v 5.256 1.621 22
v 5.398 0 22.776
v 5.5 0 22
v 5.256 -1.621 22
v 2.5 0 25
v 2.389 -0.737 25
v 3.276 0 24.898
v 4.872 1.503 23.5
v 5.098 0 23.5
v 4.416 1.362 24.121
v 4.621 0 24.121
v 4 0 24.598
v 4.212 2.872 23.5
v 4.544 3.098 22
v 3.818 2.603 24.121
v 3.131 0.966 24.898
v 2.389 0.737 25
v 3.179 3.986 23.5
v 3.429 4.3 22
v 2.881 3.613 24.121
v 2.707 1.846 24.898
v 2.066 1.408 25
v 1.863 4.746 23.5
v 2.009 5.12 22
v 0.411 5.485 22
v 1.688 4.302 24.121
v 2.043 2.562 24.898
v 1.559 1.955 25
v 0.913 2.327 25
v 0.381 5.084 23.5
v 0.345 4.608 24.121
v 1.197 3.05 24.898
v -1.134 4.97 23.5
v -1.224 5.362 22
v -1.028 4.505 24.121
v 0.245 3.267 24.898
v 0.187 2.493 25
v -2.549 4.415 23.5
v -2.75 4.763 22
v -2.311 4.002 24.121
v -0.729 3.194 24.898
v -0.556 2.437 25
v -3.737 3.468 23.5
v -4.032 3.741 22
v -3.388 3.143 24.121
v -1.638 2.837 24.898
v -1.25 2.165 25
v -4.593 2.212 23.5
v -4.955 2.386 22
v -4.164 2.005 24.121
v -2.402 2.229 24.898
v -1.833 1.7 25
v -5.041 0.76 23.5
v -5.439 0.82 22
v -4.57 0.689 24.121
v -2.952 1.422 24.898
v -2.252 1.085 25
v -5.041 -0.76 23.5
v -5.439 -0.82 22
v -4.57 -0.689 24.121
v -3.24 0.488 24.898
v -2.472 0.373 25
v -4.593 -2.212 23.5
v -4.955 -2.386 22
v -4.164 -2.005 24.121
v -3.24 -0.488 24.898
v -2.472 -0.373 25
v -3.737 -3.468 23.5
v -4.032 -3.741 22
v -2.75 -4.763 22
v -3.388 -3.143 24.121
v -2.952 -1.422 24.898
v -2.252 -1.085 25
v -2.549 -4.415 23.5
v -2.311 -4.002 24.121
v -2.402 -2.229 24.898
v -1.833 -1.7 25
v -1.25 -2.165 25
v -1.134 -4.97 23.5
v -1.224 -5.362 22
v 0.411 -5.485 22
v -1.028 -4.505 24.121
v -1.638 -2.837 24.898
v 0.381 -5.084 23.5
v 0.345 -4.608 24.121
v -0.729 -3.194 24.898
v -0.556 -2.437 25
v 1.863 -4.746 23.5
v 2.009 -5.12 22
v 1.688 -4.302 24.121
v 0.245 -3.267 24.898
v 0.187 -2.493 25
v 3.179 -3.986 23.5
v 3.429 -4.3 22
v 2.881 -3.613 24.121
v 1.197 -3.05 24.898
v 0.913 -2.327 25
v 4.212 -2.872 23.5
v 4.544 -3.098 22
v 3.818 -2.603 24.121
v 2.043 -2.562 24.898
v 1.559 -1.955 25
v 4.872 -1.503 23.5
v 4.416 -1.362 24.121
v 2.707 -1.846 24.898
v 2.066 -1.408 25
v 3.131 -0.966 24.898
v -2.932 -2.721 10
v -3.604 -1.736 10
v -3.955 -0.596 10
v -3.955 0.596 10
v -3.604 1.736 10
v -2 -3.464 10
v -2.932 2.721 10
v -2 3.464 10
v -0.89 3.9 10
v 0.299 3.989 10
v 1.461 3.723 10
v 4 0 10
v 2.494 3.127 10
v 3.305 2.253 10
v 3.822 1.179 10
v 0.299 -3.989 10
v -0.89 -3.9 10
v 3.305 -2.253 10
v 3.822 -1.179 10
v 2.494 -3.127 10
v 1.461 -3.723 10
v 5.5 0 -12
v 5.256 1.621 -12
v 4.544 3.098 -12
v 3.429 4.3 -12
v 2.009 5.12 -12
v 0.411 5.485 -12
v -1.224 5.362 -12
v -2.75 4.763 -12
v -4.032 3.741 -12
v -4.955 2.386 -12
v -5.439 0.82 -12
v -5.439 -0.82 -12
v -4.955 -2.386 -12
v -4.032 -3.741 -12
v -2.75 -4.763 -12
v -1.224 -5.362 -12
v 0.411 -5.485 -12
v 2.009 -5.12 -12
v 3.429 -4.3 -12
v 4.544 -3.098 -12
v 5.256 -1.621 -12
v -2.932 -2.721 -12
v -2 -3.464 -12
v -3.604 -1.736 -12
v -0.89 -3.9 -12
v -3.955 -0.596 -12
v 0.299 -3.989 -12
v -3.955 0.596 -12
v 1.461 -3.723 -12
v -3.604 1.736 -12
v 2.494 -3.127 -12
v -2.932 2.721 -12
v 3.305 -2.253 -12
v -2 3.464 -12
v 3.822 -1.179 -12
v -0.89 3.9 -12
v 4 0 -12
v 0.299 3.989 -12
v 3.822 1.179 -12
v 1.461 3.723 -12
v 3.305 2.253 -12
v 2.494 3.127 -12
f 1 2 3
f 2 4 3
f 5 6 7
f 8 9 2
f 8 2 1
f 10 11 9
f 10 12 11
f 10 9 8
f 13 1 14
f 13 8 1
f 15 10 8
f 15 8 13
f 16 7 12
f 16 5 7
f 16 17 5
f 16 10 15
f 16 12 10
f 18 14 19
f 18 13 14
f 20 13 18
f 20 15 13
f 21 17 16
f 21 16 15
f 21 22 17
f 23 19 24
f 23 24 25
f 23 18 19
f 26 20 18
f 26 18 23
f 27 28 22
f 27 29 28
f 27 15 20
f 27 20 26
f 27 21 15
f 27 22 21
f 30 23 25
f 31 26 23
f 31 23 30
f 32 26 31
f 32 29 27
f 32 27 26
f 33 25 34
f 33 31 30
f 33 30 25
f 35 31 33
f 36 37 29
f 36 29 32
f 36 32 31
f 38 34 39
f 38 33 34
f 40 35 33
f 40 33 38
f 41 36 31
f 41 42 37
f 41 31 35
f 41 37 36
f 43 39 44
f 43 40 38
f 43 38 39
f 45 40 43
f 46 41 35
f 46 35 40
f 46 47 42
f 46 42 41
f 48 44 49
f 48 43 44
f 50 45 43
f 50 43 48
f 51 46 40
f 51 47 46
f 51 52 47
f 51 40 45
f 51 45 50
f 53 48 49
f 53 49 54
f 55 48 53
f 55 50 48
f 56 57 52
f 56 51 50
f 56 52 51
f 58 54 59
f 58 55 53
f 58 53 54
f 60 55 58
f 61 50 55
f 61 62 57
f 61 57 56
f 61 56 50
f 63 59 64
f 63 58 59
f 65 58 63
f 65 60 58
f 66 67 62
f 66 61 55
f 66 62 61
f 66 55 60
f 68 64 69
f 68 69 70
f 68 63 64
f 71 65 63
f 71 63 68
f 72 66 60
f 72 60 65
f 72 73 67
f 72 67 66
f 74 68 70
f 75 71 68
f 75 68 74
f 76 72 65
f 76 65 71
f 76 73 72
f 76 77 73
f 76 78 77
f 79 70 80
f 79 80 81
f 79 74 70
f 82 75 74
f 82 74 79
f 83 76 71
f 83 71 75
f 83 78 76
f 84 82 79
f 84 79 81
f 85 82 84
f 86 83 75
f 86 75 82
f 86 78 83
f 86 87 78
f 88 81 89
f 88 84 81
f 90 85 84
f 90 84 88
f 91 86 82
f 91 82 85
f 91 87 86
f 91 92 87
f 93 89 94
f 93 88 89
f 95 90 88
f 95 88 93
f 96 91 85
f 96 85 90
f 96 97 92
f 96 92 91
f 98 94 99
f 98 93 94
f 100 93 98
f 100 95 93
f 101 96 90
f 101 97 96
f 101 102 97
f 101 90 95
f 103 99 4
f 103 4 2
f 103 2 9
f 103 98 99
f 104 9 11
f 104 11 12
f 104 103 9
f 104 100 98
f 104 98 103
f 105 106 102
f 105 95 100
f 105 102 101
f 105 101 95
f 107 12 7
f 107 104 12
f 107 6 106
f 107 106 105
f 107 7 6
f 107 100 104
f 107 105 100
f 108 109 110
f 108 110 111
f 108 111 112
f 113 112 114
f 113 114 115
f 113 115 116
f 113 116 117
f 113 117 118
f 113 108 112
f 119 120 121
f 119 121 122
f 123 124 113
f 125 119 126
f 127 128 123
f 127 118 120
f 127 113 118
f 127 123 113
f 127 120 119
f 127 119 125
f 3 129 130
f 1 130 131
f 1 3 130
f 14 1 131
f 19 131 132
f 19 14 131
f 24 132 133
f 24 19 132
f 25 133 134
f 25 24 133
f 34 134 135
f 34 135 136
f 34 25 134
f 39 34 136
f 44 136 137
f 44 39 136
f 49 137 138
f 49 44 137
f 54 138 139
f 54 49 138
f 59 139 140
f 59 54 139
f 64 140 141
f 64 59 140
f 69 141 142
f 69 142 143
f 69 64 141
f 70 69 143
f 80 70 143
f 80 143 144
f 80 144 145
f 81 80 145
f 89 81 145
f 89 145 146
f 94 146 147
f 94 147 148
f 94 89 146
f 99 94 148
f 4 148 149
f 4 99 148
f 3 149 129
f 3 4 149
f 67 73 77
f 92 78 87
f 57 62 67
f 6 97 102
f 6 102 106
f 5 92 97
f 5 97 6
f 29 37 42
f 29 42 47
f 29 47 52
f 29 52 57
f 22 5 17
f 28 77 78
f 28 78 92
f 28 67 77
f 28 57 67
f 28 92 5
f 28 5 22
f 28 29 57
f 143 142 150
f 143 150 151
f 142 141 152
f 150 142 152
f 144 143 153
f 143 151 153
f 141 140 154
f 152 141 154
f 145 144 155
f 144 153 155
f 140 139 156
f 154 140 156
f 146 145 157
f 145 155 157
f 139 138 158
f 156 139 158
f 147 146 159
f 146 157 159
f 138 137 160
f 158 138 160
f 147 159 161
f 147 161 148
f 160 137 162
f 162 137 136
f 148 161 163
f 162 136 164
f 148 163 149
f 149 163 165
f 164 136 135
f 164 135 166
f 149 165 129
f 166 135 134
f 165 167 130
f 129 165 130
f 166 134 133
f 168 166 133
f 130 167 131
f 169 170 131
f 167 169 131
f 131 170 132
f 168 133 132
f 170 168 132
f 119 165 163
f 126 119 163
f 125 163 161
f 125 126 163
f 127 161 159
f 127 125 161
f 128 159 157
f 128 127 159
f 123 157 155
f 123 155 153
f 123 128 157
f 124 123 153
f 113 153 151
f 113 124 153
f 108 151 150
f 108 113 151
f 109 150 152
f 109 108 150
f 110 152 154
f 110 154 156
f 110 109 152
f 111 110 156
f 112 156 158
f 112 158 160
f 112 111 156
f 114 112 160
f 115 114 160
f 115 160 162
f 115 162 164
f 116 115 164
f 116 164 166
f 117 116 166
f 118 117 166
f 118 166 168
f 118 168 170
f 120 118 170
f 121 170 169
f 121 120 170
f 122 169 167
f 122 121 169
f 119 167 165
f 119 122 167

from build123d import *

# Parameters (mm, degrees)
F0_R     = 5.5
F1_DEPTH = 25
F2_R     = 4
F3_DEPTH = 10
F4_R     = 3
F5_DEPTH = 12


with BuildPart() as f1:
    # F0 (on Top) → F1 (new body)
    with BuildSketch(Plane.XY):
        Circle(F0_R)
    extrude(amount=F1_DEPTH)

    # F2 (on face) → F3 (cut)
    with BuildSketch(Plane(origin=(0, 0, 0), x_dir=(1, 0, 0), z_dir=(0, 0, -1))):
        Circle(F2_R)
    extrude(amount=-F3_DEPTH, mode=Mode.SUBTRACT)

    # F4
    f4_edges = [f1.edges().sort_by_distance(p)[0] for p in [
        (-5.5, 0, 25),
    ]]
    fillet(f4_edges, radius=F4_R)

    # F5 (add): a face of the model
    f5_faces = [f1.faces().sort_by_distance(p)[0] for p in [
        (-5.3444365081, 0, 0),
    ]]
    extrude(f5_faces, amount=F5_DEPTH)


solid = f1.part
